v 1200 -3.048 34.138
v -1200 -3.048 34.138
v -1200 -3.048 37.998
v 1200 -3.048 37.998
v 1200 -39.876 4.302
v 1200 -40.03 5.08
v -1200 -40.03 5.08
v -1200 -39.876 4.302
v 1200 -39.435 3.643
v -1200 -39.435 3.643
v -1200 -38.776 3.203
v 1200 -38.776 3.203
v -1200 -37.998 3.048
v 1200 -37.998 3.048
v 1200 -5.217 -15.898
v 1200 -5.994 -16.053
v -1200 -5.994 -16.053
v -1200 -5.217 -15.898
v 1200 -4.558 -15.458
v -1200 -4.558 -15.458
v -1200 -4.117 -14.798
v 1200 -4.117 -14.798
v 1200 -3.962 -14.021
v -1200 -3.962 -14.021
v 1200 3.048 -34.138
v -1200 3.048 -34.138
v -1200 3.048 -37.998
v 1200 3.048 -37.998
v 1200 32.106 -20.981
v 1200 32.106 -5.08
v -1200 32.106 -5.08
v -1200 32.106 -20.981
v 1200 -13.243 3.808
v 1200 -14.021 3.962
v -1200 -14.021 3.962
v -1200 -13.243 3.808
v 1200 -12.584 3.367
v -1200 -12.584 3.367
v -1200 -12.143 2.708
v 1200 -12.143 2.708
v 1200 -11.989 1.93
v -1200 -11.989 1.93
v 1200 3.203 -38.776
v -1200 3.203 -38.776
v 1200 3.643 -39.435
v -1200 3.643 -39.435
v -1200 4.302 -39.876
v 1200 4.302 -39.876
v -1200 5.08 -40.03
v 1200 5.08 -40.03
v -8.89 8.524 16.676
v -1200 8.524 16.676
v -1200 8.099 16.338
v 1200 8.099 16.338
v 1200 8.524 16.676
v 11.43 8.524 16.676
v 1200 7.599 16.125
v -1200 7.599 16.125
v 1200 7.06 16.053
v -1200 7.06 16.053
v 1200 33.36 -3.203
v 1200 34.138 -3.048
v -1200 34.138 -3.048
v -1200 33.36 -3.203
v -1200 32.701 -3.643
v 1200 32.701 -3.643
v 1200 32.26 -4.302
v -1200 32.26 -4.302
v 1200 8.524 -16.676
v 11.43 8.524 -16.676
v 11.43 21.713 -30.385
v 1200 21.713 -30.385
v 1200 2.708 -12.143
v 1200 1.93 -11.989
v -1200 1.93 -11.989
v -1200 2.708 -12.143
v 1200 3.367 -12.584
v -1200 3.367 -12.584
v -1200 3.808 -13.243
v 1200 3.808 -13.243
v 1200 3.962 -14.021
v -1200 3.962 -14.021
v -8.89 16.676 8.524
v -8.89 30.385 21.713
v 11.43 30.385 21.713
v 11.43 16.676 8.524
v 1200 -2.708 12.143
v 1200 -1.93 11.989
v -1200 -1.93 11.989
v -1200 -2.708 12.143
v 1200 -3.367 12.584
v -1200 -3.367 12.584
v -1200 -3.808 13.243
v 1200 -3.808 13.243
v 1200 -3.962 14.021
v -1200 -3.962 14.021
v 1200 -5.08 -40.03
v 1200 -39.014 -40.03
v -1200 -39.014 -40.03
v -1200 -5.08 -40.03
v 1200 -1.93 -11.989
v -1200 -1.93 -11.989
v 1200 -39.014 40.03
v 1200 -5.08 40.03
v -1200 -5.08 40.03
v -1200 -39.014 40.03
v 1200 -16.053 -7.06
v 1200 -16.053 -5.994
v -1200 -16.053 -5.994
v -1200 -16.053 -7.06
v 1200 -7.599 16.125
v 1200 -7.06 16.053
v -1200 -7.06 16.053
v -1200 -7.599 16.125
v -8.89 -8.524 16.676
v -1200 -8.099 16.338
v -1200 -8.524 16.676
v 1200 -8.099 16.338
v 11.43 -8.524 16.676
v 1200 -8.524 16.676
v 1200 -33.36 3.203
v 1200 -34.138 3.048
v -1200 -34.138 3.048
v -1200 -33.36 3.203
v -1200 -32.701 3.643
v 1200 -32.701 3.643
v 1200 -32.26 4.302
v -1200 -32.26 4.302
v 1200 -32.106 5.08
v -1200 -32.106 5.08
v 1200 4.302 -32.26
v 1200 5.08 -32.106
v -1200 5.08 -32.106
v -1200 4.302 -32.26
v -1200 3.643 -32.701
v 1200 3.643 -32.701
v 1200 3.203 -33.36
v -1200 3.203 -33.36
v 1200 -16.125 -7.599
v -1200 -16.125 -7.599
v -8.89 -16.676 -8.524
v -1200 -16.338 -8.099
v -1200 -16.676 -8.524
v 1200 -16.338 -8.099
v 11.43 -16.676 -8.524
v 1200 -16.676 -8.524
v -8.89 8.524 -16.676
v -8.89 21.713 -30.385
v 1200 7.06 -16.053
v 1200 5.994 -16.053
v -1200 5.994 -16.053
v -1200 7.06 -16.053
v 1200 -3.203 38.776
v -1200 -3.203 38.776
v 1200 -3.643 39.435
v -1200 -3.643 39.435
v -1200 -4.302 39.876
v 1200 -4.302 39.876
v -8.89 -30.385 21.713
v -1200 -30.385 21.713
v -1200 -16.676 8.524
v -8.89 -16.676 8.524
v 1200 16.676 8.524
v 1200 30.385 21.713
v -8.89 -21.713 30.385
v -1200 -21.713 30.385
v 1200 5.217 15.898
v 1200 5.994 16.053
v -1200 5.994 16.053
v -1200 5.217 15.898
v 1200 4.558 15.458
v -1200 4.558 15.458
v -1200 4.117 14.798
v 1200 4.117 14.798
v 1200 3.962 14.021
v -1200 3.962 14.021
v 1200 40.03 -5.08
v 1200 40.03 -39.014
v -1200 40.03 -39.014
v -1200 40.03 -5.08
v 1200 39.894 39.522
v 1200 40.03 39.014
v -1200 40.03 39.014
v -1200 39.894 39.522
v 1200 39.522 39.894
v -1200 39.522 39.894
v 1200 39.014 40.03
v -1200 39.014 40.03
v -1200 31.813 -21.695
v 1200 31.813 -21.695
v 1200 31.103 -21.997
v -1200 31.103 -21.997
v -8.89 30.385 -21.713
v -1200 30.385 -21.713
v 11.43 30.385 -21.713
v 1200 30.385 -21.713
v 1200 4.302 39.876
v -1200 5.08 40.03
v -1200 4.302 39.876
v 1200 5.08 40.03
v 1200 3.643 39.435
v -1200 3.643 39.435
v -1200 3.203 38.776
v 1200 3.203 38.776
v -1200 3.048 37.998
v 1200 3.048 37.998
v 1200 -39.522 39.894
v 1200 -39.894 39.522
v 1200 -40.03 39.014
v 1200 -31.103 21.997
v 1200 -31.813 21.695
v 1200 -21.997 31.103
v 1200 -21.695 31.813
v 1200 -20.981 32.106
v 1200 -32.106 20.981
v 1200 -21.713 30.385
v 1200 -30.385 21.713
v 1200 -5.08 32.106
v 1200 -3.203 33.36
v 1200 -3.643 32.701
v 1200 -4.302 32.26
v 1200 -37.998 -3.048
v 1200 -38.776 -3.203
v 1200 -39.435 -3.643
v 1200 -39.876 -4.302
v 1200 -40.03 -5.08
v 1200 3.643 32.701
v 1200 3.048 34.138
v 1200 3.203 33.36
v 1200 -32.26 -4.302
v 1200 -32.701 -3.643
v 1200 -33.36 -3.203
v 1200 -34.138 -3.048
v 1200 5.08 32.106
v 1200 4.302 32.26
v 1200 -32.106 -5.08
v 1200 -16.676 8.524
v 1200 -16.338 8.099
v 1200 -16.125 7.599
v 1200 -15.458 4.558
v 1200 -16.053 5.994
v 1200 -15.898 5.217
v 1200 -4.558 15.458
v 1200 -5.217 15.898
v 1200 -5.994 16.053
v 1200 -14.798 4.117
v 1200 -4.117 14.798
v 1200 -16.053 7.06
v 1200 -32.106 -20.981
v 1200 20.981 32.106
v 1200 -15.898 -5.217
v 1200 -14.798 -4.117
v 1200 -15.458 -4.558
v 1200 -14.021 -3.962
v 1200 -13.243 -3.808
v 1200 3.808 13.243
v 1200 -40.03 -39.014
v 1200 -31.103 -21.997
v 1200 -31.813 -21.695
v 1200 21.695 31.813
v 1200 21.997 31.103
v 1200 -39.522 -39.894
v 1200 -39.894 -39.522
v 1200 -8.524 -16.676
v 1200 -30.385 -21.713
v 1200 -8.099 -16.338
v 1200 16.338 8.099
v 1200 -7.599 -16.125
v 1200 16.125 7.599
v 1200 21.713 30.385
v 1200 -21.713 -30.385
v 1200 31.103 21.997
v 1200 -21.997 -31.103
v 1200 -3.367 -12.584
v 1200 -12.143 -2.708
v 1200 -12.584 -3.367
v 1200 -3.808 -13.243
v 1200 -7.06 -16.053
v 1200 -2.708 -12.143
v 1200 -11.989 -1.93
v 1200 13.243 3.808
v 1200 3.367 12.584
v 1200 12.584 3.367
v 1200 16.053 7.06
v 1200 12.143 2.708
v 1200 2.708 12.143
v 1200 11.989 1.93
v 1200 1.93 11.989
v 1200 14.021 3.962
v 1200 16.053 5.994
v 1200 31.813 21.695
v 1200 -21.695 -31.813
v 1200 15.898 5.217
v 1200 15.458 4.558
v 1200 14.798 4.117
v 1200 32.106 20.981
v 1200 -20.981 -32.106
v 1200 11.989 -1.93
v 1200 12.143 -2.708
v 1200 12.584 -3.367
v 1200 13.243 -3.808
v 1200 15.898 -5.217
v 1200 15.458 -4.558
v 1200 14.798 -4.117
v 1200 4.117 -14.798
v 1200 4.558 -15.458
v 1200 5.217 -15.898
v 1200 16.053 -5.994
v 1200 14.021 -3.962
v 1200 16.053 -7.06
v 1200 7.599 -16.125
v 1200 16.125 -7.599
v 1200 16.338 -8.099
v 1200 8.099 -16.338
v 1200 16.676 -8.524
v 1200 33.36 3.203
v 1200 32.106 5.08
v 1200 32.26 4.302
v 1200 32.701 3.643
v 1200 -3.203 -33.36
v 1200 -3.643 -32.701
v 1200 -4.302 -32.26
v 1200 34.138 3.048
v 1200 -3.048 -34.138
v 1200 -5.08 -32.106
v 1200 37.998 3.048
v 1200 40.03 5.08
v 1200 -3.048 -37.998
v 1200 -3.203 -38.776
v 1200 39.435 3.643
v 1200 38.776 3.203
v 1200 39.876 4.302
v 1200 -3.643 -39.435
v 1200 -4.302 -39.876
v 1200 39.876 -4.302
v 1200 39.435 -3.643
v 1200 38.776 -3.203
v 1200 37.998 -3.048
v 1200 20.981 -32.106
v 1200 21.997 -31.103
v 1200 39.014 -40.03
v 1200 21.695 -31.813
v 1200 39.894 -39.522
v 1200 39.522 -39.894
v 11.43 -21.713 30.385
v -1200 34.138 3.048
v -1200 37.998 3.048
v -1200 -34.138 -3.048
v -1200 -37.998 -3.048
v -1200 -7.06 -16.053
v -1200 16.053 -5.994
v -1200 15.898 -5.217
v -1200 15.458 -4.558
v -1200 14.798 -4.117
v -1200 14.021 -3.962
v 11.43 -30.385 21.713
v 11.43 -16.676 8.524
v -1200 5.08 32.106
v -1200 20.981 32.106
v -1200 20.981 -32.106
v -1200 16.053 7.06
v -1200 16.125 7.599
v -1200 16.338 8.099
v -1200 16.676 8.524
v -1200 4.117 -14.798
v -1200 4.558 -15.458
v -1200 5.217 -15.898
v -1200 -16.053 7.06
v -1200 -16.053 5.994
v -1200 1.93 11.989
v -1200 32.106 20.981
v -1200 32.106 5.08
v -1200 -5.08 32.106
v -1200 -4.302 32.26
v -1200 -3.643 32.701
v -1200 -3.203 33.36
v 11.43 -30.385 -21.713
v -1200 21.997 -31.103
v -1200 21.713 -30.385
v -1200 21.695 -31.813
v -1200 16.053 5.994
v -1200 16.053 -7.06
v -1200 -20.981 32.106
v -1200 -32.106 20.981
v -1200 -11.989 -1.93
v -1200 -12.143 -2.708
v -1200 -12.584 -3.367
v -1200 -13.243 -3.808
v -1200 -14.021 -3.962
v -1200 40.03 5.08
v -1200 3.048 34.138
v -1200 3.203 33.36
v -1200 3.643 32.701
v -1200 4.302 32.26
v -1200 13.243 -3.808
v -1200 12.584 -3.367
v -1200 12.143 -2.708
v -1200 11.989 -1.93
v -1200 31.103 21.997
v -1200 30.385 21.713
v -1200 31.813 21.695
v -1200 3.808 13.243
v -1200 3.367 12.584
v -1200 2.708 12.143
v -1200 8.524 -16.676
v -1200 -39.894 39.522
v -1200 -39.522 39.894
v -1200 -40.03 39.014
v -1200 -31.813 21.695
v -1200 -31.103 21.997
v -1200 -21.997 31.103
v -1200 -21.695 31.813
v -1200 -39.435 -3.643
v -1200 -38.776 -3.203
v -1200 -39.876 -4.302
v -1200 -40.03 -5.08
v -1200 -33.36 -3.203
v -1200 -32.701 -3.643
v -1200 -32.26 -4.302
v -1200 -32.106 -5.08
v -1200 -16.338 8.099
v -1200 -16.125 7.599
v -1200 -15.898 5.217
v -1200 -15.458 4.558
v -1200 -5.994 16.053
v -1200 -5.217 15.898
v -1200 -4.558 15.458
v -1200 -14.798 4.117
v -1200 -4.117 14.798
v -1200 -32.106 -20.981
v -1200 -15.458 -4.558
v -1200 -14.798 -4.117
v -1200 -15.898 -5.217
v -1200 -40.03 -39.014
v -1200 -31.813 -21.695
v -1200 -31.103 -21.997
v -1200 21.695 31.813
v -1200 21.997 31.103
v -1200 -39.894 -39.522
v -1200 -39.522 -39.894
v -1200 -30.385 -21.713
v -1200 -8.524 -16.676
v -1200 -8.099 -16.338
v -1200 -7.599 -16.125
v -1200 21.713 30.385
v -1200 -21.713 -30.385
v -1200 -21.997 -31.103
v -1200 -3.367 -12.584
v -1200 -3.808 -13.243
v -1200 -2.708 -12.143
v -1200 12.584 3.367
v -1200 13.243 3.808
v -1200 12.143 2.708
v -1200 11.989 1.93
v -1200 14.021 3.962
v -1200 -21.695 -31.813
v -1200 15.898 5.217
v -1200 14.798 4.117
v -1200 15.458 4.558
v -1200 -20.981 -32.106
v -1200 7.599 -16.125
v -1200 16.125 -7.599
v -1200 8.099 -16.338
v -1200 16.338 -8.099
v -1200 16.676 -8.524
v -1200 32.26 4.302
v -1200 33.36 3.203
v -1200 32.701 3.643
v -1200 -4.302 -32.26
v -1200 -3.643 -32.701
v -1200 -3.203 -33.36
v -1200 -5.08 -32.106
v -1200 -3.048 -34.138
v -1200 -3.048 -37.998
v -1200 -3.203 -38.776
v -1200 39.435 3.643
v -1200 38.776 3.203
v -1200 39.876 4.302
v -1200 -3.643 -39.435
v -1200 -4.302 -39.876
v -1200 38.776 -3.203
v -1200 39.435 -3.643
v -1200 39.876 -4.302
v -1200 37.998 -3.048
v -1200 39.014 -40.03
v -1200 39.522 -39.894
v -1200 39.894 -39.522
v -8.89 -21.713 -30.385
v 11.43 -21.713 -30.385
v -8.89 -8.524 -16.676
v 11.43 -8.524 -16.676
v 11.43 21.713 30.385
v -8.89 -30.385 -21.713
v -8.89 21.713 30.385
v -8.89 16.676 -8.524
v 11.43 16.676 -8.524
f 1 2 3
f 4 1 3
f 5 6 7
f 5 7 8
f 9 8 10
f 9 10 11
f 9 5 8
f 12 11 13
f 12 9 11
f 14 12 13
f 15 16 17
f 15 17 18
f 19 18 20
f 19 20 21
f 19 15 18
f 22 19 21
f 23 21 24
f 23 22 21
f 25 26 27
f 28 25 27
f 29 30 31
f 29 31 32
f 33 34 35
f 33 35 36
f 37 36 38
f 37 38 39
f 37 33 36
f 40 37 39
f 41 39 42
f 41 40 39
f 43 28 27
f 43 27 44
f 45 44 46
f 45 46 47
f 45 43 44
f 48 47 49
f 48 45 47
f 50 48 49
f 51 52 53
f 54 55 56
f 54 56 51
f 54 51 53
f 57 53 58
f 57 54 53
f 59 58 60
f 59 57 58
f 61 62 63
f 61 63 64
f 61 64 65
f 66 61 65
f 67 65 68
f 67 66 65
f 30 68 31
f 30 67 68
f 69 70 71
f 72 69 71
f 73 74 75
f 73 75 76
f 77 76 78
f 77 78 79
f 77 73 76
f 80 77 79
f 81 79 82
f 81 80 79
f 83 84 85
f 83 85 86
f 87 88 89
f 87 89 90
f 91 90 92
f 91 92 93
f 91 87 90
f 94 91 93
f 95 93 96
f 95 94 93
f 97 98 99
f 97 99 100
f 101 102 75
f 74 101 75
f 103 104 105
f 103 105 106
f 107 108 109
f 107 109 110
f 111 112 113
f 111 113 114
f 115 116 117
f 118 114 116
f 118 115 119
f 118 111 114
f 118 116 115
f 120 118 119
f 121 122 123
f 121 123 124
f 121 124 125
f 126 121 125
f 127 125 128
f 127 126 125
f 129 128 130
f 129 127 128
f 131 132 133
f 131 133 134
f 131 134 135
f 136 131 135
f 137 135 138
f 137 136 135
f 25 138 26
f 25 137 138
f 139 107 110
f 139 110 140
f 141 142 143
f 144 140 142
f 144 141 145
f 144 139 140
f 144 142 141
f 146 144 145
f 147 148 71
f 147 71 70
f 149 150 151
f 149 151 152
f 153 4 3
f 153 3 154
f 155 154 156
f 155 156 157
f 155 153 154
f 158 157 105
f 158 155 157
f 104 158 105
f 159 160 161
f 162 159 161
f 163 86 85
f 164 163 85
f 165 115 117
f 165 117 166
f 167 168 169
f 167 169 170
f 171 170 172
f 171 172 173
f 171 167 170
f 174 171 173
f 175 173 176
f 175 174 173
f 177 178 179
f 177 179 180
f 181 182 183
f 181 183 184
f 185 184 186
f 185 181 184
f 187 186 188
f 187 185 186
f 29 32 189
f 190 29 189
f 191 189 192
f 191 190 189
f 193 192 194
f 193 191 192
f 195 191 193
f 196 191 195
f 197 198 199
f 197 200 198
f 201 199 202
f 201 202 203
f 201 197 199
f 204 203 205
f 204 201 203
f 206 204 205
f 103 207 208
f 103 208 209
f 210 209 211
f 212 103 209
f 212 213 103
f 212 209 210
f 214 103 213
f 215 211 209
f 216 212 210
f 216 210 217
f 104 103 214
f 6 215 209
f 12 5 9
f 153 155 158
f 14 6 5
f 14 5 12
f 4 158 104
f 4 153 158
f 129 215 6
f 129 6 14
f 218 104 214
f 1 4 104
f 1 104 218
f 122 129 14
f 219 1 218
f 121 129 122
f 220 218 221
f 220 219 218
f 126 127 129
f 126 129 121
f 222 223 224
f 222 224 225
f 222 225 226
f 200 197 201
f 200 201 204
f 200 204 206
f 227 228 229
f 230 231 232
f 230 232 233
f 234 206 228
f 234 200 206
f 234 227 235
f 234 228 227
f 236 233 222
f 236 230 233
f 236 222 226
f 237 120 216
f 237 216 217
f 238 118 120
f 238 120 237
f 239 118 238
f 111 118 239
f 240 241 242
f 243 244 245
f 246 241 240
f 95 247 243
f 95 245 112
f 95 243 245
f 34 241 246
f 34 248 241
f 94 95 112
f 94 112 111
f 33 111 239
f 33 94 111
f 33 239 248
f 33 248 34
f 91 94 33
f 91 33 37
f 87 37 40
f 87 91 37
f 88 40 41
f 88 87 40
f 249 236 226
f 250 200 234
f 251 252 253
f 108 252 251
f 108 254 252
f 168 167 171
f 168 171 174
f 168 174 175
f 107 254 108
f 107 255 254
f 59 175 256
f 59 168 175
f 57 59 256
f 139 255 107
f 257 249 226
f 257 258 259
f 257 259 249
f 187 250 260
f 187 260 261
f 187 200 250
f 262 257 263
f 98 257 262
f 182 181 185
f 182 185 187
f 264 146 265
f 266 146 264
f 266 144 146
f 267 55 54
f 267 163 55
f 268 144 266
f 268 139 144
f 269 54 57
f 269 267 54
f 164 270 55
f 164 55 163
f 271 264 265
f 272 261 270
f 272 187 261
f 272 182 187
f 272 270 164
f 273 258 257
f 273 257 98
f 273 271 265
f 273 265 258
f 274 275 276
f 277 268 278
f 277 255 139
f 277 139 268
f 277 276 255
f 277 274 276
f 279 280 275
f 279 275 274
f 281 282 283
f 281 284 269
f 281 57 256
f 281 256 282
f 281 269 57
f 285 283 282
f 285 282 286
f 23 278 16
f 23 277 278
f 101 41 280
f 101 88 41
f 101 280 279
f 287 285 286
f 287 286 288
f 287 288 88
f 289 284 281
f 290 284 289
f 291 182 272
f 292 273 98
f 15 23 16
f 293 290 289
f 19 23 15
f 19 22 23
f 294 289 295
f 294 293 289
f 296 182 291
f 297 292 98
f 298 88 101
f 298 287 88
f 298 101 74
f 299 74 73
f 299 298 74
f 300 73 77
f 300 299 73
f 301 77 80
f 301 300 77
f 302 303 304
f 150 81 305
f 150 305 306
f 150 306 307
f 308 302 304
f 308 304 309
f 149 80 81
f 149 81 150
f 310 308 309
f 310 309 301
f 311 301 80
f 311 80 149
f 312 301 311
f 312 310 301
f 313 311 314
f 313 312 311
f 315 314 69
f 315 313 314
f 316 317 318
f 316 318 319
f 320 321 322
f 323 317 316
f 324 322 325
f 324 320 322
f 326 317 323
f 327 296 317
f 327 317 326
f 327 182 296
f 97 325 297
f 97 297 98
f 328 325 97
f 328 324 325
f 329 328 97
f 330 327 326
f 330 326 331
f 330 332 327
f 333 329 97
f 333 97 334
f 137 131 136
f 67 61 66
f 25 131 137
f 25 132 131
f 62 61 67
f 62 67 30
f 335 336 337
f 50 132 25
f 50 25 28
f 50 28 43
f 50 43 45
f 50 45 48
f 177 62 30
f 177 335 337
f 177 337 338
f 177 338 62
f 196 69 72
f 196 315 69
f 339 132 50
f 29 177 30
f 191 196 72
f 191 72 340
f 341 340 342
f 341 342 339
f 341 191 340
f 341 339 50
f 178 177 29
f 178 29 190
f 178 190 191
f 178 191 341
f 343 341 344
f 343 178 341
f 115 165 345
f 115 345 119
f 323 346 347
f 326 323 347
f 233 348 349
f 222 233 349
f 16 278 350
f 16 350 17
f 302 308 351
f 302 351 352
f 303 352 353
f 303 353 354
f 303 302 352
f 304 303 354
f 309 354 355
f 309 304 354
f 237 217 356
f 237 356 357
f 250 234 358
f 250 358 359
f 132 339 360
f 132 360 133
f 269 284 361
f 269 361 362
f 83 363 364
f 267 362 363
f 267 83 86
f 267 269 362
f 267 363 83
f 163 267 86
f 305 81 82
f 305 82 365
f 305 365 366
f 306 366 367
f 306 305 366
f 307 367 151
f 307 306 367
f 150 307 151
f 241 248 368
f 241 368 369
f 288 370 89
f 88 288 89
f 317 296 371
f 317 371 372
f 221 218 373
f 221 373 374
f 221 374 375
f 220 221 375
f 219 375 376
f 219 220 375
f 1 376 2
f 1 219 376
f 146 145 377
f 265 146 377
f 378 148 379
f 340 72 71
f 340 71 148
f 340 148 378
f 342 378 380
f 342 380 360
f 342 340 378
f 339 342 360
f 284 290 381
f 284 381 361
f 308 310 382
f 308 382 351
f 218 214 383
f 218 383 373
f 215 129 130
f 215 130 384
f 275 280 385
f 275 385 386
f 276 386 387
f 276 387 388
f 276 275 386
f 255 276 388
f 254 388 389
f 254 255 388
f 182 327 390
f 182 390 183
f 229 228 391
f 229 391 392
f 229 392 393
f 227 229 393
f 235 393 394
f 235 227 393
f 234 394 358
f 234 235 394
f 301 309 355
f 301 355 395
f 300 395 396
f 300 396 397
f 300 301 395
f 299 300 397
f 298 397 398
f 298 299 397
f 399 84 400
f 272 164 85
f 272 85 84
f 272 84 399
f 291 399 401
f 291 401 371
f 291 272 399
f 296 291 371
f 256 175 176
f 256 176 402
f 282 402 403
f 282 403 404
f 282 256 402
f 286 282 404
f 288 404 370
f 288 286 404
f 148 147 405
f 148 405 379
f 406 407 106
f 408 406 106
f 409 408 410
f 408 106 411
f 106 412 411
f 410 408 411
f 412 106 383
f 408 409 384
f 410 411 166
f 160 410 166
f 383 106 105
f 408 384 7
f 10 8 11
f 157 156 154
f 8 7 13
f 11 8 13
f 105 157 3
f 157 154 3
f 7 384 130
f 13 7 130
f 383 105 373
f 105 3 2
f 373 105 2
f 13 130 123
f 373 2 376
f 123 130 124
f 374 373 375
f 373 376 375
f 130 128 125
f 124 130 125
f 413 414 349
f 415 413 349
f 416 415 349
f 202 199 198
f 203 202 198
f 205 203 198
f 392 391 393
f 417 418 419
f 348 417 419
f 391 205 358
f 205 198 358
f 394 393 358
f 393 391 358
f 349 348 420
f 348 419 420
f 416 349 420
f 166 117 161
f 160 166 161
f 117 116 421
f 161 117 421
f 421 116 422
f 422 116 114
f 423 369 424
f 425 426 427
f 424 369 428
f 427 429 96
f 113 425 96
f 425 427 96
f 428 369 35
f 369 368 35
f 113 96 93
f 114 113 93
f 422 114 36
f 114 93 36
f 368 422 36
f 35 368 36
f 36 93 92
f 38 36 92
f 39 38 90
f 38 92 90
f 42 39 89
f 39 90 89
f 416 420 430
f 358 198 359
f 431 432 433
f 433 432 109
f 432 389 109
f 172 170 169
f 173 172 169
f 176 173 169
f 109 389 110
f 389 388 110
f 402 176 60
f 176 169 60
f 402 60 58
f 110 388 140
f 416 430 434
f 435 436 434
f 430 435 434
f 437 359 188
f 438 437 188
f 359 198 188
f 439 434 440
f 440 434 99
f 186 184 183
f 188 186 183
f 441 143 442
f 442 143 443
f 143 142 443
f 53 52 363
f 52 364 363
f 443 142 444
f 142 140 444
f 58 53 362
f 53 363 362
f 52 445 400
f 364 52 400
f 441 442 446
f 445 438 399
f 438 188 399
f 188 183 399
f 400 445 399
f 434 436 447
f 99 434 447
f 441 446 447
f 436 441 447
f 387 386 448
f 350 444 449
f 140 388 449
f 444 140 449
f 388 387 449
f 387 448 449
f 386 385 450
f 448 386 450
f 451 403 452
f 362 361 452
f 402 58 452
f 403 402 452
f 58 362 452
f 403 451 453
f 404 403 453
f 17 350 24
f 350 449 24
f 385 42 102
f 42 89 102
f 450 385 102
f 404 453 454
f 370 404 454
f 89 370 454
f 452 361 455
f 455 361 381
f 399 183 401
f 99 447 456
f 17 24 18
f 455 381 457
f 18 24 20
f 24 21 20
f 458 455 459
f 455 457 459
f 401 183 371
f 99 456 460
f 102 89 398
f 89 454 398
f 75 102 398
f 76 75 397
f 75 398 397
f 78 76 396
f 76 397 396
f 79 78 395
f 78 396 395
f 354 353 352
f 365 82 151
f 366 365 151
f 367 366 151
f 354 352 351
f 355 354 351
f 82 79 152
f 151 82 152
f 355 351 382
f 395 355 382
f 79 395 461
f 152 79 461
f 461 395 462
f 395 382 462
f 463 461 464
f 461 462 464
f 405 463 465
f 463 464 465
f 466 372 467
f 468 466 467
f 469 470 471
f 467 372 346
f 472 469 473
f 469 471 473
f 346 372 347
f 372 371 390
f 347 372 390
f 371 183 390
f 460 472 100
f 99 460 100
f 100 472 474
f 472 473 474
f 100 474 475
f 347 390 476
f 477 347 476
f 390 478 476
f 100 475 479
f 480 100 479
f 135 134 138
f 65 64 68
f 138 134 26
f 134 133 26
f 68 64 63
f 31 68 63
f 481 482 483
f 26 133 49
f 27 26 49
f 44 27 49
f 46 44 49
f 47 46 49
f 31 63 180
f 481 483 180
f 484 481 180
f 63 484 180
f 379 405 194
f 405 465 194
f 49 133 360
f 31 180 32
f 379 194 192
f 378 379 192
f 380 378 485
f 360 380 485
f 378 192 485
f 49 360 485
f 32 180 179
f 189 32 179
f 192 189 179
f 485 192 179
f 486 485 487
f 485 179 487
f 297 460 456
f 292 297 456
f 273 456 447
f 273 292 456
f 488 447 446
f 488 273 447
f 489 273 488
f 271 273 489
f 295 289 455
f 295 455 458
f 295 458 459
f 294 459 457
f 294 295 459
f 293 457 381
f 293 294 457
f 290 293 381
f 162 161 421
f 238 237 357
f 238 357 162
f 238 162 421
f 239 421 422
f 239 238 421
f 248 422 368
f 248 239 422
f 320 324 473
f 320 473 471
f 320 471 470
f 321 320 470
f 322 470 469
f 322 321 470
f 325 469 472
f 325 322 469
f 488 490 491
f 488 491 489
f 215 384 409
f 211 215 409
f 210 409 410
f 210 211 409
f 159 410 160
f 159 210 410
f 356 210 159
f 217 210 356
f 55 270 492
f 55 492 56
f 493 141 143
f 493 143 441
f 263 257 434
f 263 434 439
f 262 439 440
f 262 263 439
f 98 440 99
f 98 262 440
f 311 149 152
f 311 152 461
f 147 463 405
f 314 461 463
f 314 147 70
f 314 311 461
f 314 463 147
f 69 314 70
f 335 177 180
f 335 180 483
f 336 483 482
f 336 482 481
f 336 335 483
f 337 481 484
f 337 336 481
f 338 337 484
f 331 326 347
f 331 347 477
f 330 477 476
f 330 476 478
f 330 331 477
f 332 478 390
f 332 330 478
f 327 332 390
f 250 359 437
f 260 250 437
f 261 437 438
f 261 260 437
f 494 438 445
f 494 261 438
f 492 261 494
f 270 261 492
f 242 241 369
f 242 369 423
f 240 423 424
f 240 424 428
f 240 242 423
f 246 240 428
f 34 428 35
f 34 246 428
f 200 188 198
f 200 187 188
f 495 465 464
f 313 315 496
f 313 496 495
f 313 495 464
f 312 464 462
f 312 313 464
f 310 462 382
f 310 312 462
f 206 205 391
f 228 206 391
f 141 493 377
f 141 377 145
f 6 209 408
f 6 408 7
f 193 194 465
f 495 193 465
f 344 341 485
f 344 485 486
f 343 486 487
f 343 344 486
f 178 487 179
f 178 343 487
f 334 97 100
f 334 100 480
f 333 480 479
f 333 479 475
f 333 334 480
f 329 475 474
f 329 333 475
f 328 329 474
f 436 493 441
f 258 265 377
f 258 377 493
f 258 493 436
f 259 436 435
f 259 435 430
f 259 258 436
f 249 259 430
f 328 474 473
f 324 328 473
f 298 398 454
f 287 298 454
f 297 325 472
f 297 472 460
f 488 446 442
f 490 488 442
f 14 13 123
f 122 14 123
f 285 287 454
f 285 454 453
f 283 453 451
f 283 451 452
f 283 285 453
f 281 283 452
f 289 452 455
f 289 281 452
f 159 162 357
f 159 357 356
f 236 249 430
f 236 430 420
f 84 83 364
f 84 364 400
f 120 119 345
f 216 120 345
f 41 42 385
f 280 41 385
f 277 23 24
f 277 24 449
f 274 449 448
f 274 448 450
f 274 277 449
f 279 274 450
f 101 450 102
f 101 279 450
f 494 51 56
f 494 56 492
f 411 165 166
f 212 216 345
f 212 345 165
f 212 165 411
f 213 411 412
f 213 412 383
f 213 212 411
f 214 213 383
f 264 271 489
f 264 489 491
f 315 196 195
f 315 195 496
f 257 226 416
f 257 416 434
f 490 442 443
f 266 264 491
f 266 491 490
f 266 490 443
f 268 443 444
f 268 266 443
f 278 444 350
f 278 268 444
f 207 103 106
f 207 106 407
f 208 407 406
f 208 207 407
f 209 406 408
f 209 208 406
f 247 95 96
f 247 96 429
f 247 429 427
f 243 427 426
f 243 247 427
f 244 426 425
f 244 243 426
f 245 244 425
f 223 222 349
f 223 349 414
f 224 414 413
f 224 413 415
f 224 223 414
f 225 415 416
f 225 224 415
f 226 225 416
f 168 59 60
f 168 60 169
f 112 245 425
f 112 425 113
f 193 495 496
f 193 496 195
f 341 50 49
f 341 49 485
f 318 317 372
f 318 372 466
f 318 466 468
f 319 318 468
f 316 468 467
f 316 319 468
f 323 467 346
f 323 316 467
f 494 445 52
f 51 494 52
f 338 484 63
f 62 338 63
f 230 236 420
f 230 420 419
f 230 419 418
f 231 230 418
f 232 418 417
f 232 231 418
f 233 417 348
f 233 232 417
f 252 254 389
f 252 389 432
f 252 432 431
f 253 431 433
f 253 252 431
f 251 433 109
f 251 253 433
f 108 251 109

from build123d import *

# Parameters (mm, degrees)
BOSS_EXTRUDE1_DEPTH = 2.54
SCALE1_SCALE        = 8
BOSS_EXTRUDE2_DEPTH = 1200


with BuildPart() as part:
    # Sketch1 → Boss-Extrude1 (new body)
    with BuildSketch(Plane(origin=(0, 0, 0), x_dir=(0, 0, -1), z_dir=(1, 0, 0))):
        with BuildLine():
            Line((-0.2413, 1.4986), (0.2413, 1.4986))
            ThreePointArc((0.2413, 1.4986), (0.420905122, 1.572994878), (0.4953, 1.7526))
            ThreePointArc((0.4953, 1.7526), (0.569694878, 1.932205122), (0.7493, 2.0066))
            Line((0.7493, 2.0066), (0.882498635, 2.0066))
            ThreePointArc((0.882498635, 2.0066), (0.981966313, 2.026886113), (1.065545703, 2.084504086))
            Line((1.065545703, 2.084504086), (2.714118421, 3.798152043))
            ThreePointArc((2.714118421, 3.798152043), (2.739451831, 3.935933839), (2.622594887, 4.0132))
            Line((2.622594887, 4.0132), (0.635, 4.0132))
            ThreePointArc((0.635, 4.0132), (0.455394878, 4.087594878), (0.381, 4.2672))
            Line((0.381, 4.2672), (0.381, 4.7498))
            ThreePointArc((0.381, 4.7498), (0.455394878, 4.929405122), (0.635, 5.0038))
            Line((0.635, 5.0038), (4.8768, 5.0038))
            ThreePointArc((4.8768, 5.0038), (4.966602561, 4.966602561), (5.0038, 4.8768))
            Line((5.0038, 4.8768), (5.0038, 0.635))
            ThreePointArc((5.0038, 0.635), (4.929405122, 0.455394878), (4.7498, 0.381))
            Line((4.7498, 0.381), (4.2672, 0.381))
            ThreePointArc((4.2672, 0.381), (4.087594878, 0.455394878), (4.0132, 0.635))
            Line((4.0132, 0.635), (4.0132, 2.622594887))
            ThreePointArc((4.0132, 2.622594887), (3.935933839, 2.739451831), (3.798152043, 2.714118421))
            Line((3.798152043, 2.714118421), (2.084504086, 1.065545703))
            ThreePointArc((2.084504086, 1.065545703), (2.026886113, 0.981966313), (2.0066, 0.882498635))
            Line((2.0066, 0.882498635), (2.0066, 0.7493))
            ThreePointArc((2.0066, 0.7493), (1.932205122, 0.569694878), (1.7526, 0.4953))
            ThreePointArc((1.7526, 0.4953), (1.572994878, 0.420905122), (1.4986, 0.2413))
            Line((1.4986, 0.2413), (1.4986, -0.2413))
            ThreePointArc((1.4986, -0.2413), (1.572994878, -0.420905122), (1.7526, -0.4953))
            ThreePointArc((1.7526, -0.4953), (1.932205122, -0.569694878), (2.0066, -0.7493))
            Line((2.0066, -0.7493), (2.0066, -0.882498635))
            ThreePointArc((2.0066, -0.882498635), (2.026886113, -0.981966313), (2.084504086, -1.065545703))
            Line((2.084504086, -1.065545703), (3.798152043, -2.714118421))
            ThreePointArc((3.798152043, -2.714118421), (3.935933839, -2.739451831), (4.0132, -2.622594887))
            Line((4.0132, -2.622594887), (4.0132, -0.635))
            ThreePointArc((4.0132, -0.635), (4.087594878, -0.455394878), (4.2672, -0.381))
            Line((4.2672, -0.381), (4.7498, -0.381))
            ThreePointArc((4.7498, -0.381), (4.929405122, -0.455394878), (5.0038, -0.635))
            Line((5.0038, -0.635), (5.0038, -4.8768))
            ThreePointArc((5.0038, -4.8768), (4.966602561, -4.966602561), (4.8768, -5.0038))
            Line((4.8768, -5.0038), (0.635, -5.0038))
            ThreePointArc((0.635, -5.0038), (0.455394878, -4.929405122), (0.381, -4.7498))
            Line((0.381, -4.7498), (0.381, -4.2672))
            ThreePointArc((0.381, -4.2672), (0.455394878, -4.087594878), (0.635, -4.0132))
            Line((0.635, -4.0132), (2.622594887, -4.0132))
            ThreePointArc((2.622594887, -4.0132), (2.739451831, -3.935933839), (2.714118421, -3.798152043))
            Line((2.714118421, -3.798152043), (1.065545703, -2.084504086))
            ThreePointArc((1.065545703, -2.084504086), (0.981966313, -2.026886113), (0.882498635, -2.0066))
            Line((0.882498635, -2.0066), (0.7493, -2.0066))
            ThreePointArc((0.7493, -2.0066), (0.569694878, -1.932205122), (0.4953, -1.7526))
            ThreePointArc((0.4953, -1.7526), (0.420905122, -1.572994878), (0.2413, -1.4986))
            Line((0.2413, -1.4986), (-0.2413, -1.4986))
            ThreePointArc((-0.2413, -1.4986), (-0.420905122, -1.572994878), (-0.4953, -1.7526))
            ThreePointArc((-0.4953, -1.7526), (-0.569694878, -1.932205122), (-0.7493, -2.0066))
            Line((-0.7493, -2.0066), (-0.882498635, -2.0066))
            ThreePointArc((-0.882498635, -2.0066), (-0.981966313, -2.026886113), (-1.065545703, -2.084504086))
            Line((-1.065545703, -2.084504086), (-2.714118421, -3.798152043))
            ThreePointArc((-2.714118421, -3.798152043), (-2.739451831, -3.935933839), (-2.622594887, -4.0132))
            Line((-2.622594887, -4.0132), (-0.635, -4.0132))
            ThreePointArc((-0.635, -4.0132), (-0.455394878, -4.087594878), (-0.381, -4.2672))
            Line((-0.381, -4.2672), (-0.381, -4.7498))
            ThreePointArc((-0.381, -4.7498), (-0.455394878, -4.929405122), (-0.635, -5.0038))
            Line((-0.635, -5.0038), (-4.8768, -5.0038))
            ThreePointArc((-4.8768, -5.0038), (-4.966602561, -4.966602561), (-5.0038, -4.8768))
            Line((-5.0038, -4.8768), (-5.0038, -0.635))
            ThreePointArc((-5.0038, -0.635), (-4.929405122, -0.455394878), (-4.7498, -0.381))
            Line((-4.7498, -0.381), (-4.2672, -0.381))
            ThreePointArc((-4.2672, -0.381), (-4.087594878, -0.455394878), (-4.0132, -0.635))
            Line((-4.0132, -0.635), (-4.0132, -2.622594887))
            ThreePointArc((-4.0132, -2.622594887), (-3.935933839, -2.739451831), (-3.798152043, -2.714118421))
            Line((-3.798152043, -2.714118421), (-2.084504086, -1.065545703))
            ThreePointArc((-2.084504086, -1.065545703), (-2.026886113, -0.981966313), (-2.0066, -0.882498635))
            Line((-2.0066, -0.882498635), (-2.0066, -0.7493))
            ThreePointArc((-2.0066, -0.7493), (-1.932205122, -0.569694878), (-1.7526, -0.4953))
            ThreePointArc((-1.7526, -0.4953), (-1.572994878, -0.420905122), (-1.4986, -0.2413))
            Line((-1.4986, -0.2413), (-1.4986, 0.2413))
            ThreePointArc((-1.4986, 0.2413), (-1.572994878, 0.420905122), (-1.7526, 0.4953))
            ThreePointArc((-1.7526, 0.4953), (-1.932205122, 0.569694878), (-2.0066, 0.7493))
            Line((-2.0066, 0.7493), (-2.0066, 0.882498635))
            ThreePointArc((-2.0066, 0.882498635), (-2.026886113, 0.981966313), (-2.084504086, 1.065545703))
            Line((-2.084504086, 1.065545703), (-3.798152043, 2.714118421))
            ThreePointArc((-3.798152043, 2.714118421), (-3.935933839, 2.739451831), (-4.0132, 2.622594887))
            Line((-4.0132, 2.622594887), (-4.0132, 0.635))
            ThreePointArc((-4.0132, 0.635), (-4.087594878, 0.455394878), (-4.2672, 0.381))
            Line((-4.2672, 0.381), (-4.7498, 0.381))
            ThreePointArc((-4.7498, 0.381), (-4.929405122, 0.455394878), (-5.0038, 0.635))
            Line((-5.0038, 0.635), (-5.0038, 4.8768))
            ThreePointArc((-5.0038, 4.8768), (-4.966602561, 4.966602561), (-4.8768, 5.0038))
            Line((-4.8768, 5.0038), (-0.635, 5.0038))
            ThreePointArc((-0.635, 5.0038), (-0.455394878, 4.929405122), (-0.381, 4.7498))
            Line((-0.381, 4.7498), (-0.381, 4.2672))
            ThreePointArc((-0.381, 4.2672), (-0.455394878, 4.087594878), (-0.635, 4.0132))
            Line((-0.635, 4.0132), (-2.622594887, 4.0132))
            ThreePointArc((-2.622594887, 4.0132), (-2.739451831, 3.935933839), (-2.714118421, 3.798152043))
            Line((-2.714118421, 3.798152043), (-1.065545703, 2.084504086))
            ThreePointArc((-1.065545703, 2.084504086), (-0.981966313, 2.026886113), (-0.882498635, 2.0066))
            Line((-0.882498635, 2.0066), (-0.7493, 2.0066))
            ThreePointArc((-0.7493, 2.0066), (-0.569694878, 1.932205122), (-0.4953, 1.7526))
            ThreePointArc((-0.4953, 1.7526), (-0.420905122, 1.572994878), (-0.2413, 1.4986))
        make_face()
    extrude(amount=BOSS_EXTRUDE1_DEPTH)


with BuildPart() as part_1:
    # Scale1: scaled about (1.27, 0, 0)
    add(part.part.scale(SCALE1_SCALE).moved(Location((-8.89, 0, 0))))

    # Sketch2 → Boss-Extrude2 (add, symmetric)
    with BuildSketch(Plane(origin=(0, 0, 0), x_dir=(0, 0, -1), z_dir=(1, 0, 0))):
        with BuildLine():
            Line((-37.9984, 3.048), (-34.1376, 3.048))
            ThreePointArc((-34.1376, 3.048), (-32.700759021, 3.643159021), (-32.1056, 5.08))
            Line((-32.1056, 5.08), (-32.1056, 20.980759097))
            ThreePointArc((-32.1056, 20.980759097), (-31.487470712, 21.915614646), (-30.385216345, 21.71294737))
            Line((-30.385216345, 21.71294737), (-16.67603269, 8.524365626))
            ThreePointArc((-16.67603269, 8.524365626), (-16.215088903, 7.855730504), (-16.0528, 7.059989081))
            Line((-16.0528, 7.059989081), (-16.0528, 5.9944))
            ThreePointArc((-16.0528, 5.9944), (-15.457640979, 4.557559021), (-14.0208, 3.9624))
            ThreePointArc((-14.0208, 3.9624), (-12.583959021, 3.367240979), (-11.9888, 1.9304))
            Line((-11.9888, 1.9304), (-11.9888, -1.9304))
            ThreePointArc((-11.9888, -1.9304), (-12.583959021, -3.367240979), (-14.0208, -3.9624))
            ThreePointArc((-14.0208, -3.9624), (-15.457640979, -4.557559021), (-16.0528, -5.9944))
            Line((-16.0528, -5.9944), (-16.0528, -7.059989081))
            ThreePointArc((-16.0528, -7.059989081), (-16.215088903, -7.855730504), (-16.67603269, -8.524365626))
            Line((-16.67603269, -8.524365626), (-30.385216345, -21.71294737))
            ThreePointArc((-30.385216345, -21.71294737), (-31.487470712, -21.915614646), (-32.1056, -20.980759097))
            Line((-32.1056, -20.980759097), (-32.1056, -5.08))
            ThreePointArc((-32.1056, -5.08), (-32.700759021, -3.643159021), (-34.1376, -3.048))
            Line((-34.1376, -3.048), (-37.9984, -3.048))
            ThreePointArc((-37.9984, -3.048), (-39.435240979, -3.643159021), (-40.0304, -5.08))
            Line((-40.0304, -5.08), (-40.0304, -39.0144))
            ThreePointArc((-40.0304, -39.0144), (-39.73282049, -39.73282049), (-39.0144, -40.0304))
            Line((-39.0144, -40.0304), (-5.08, -40.0304))
            ThreePointArc((-5.08, -40.0304), (-3.643159021, -39.435240979), (-3.048, -37.9984))
            Line((-3.048, -37.9984), (-3.048, -34.1376))
            ThreePointArc((-3.048, -34.1376), (-3.643159021, -32.700759021), (-5.08, -32.1056))
            Line((-5.08, -32.1056), (-20.980759097, -32.1056))
            ThreePointArc((-20.980759097, -32.1056), (-21.915614646, -31.487470712), (-21.71294737, -30.385216345))
            Line((-21.71294737, -30.385216345), (-8.524365626, -16.67603269))
            ThreePointArc((-8.524365626, -16.67603269), (-7.855730504, -16.215088903), (-7.059989081, -16.0528))
            Line((-7.059989081, -16.0528), (-5.9944, -16.0528))
            ThreePointArc((-5.9944, -16.0528), (-4.557559021, -15.457640979), (-3.9624, -14.0208))
            ThreePointArc((-3.9624, -14.0208), (-3.367240979, -12.583959021), (-1.9304, -11.9888))
            Line((-1.9304, -11.9888), (1.9304, -11.9888))
            ThreePointArc((1.9304, -11.9888), (3.367240979, -12.583959021), (3.9624, -14.0208))
            ThreePointArc((3.9624, -14.0208), (4.557559021, -15.457640979), (5.9944, -16.0528))
            Line((5.9944, -16.0528), (7.059989081, -16.0528))
            ThreePointArc((7.059989081, -16.0528), (7.855730504, -16.215088903), (8.524365626, -16.67603269))
            Line((8.524365626, -16.67603269), (21.71294737, -30.385216345))
            ThreePointArc((21.71294737, -30.385216345), (21.915614646, -31.487470712), (20.980759097, -32.1056))
            Line((20.980759097, -32.1056), (5.08, -32.1056))
            ThreePointArc((5.08, -32.1056), (3.643159021, -32.700759021), (3.048, -34.1376))
            Line((3.048, -34.1376), (3.048, -37.9984))
            ThreePointArc((3.048, -37.9984), (3.643159021, -39.435240979), (5.08, -40.0304))
            Line((5.08, -40.0304), (39.0144, -40.0304))
            ThreePointArc((39.0144, -40.0304), (39.73282049, -39.73282049), (40.0304, -39.0144))
            Line((40.0304, -39.0144), (40.0304, -5.08))
            ThreePointArc((40.0304, -5.08), (39.435240979, -3.643159021), (37.9984, -3.048))
            Line((37.9984, -3.048), (34.1376, -3.048))
            ThreePointArc((34.1376, -3.048), (32.700759021, -3.643159021), (32.1056, -5.08))
            Line((32.1056, -5.08), (32.1056, -20.980759097))
            ThreePointArc((32.1056, -20.980759097), (31.487470712, -21.915614646), (30.385216345, -21.71294737))
            Line((30.385216345, -21.71294737), (16.67603269, -8.524365626))
            ThreePointArc((16.67603269, -8.524365626), (16.215088903, -7.855730504), (16.0528, -7.059989081))
            Line((16.0528, -7.059989081), (16.0528, -5.9944))
            ThreePointArc((16.0528, -5.9944), (15.457640979, -4.557559021), (14.0208, -3.9624))
            ThreePointArc((14.0208, -3.9624), (12.583959021, -3.367240979), (11.9888, -1.9304))
            Line((11.9888, -1.9304), (11.9888, 1.9304))
            ThreePointArc((11.9888, 1.9304), (12.583959021, 3.367240979), (14.0208, 3.9624))
            ThreePointArc((14.0208, 3.9624), (15.457640979, 4.557559021), (16.0528, 5.9944))
            Line((16.0528, 5.9944), (16.0528, 7.059989081))
            ThreePointArc((16.0528, 7.059989081), (16.215088903, 7.855730504), (16.67603269, 8.524365626))
            Line((16.67603269, 8.524365626), (30.385216345, 21.71294737))
            ThreePointArc((30.385216345, 21.71294737), (31.487470712, 21.915614646), (32.1056, 20.980759097))
            Line((32.1056, 20.980759097), (32.1056, 5.08))
            ThreePointArc((32.1056, 5.08), (32.700759021, 3.643159021), (34.1376, 3.048))
            Line((34.1376, 3.048), (37.9984, 3.048))
            ThreePointArc((37.9984, 3.048), (39.435240979, 3.643159021), (40.0304, 5.08))
            Line((40.0304, 5.08), (40.0304, 39.0144))
            ThreePointArc((40.0304, 39.0144), (39.73282049, 39.73282049), (39.0144, 40.0304))
            Line((39.0144, 40.0304), (5.08, 40.0304))
            ThreePointArc((5.08, 40.0304), (3.643159021, 39.435240979), (3.048, 37.9984))
            Line((3.048, 37.9984), (3.048, 34.1376))
            ThreePointArc((3.048, 34.1376), (3.643159021, 32.700759021), (5.08, 32.1056))
            Line((5.08, 32.1056), (20.980759097, 32.1056))
            ThreePointArc((20.980759097, 32.1056), (21.915614646, 31.487470712), (21.71294737, 30.385216345))
            Line((21.71294737, 30.385216345), (8.524365626, 16.67603269))
            ThreePointArc((8.524365626, 16.67603269), (7.855730504, 16.215088903), (7.059989081, 16.0528))
            Line((7.059989081, 16.0528), (5.9944, 16.0528))
            ThreePointArc((5.9944, 16.0528), (4.557559021, 15.457640979), (3.9624, 14.0208))
            ThreePointArc((3.9624, 14.0208), (3.367240979, 12.583959021), (1.9304, 11.9888))
            Line((1.9304, 11.9888), (-1.9304, 11.9888))
            ThreePointArc((-1.9304, 11.9888), (-3.367240979, 12.583959021), (-3.9624, 14.0208))
            ThreePointArc((-3.9624, 14.0208), (-4.557559021, 15.457640979), (-5.9944, 16.0528))
            Line((-5.9944, 16.0528), (-7.059989081, 16.0528))
            ThreePointArc((-7.059989081, 16.0528), (-7.855730504, 16.215088903), (-8.524365626, 16.67603269))
            Line((-8.524365626, 16.67603269), (-21.71294737, 30.385216345))
            ThreePointArc((-21.71294737, 30.385216345), (-21.915614646, 31.487470712), (-20.980759097, 32.1056))
            Line((-20.980759097, 32.1056), (-5.08, 32.1056))
            ThreePointArc((-5.08, 32.1056), (-3.643159021, 32.700759021), (-3.048, 34.1376))
            Line((-3.048, 34.1376), (-3.048, 37.9984))
            ThreePointArc((-3.048, 37.9984), (-3.643159021, 39.435240979), (-5.08, 40.0304))
            Line((-5.08, 40.0304), (-39.0144, 40.0304))
            ThreePointArc((-39.0144, 40.0304), (-39.73282049, 39.73282049), (-40.0304, 39.0144))
            Line((-40.0304, 39.0144), (-40.0304, 5.08))
            ThreePointArc((-40.0304, 5.08), (-39.435240979, 3.643159021), (-37.9984, 3.048))
        make_face()
    extrude(amount=BOSS_EXTRUDE2_DEPTH, both=True)


solid = part_1.part
